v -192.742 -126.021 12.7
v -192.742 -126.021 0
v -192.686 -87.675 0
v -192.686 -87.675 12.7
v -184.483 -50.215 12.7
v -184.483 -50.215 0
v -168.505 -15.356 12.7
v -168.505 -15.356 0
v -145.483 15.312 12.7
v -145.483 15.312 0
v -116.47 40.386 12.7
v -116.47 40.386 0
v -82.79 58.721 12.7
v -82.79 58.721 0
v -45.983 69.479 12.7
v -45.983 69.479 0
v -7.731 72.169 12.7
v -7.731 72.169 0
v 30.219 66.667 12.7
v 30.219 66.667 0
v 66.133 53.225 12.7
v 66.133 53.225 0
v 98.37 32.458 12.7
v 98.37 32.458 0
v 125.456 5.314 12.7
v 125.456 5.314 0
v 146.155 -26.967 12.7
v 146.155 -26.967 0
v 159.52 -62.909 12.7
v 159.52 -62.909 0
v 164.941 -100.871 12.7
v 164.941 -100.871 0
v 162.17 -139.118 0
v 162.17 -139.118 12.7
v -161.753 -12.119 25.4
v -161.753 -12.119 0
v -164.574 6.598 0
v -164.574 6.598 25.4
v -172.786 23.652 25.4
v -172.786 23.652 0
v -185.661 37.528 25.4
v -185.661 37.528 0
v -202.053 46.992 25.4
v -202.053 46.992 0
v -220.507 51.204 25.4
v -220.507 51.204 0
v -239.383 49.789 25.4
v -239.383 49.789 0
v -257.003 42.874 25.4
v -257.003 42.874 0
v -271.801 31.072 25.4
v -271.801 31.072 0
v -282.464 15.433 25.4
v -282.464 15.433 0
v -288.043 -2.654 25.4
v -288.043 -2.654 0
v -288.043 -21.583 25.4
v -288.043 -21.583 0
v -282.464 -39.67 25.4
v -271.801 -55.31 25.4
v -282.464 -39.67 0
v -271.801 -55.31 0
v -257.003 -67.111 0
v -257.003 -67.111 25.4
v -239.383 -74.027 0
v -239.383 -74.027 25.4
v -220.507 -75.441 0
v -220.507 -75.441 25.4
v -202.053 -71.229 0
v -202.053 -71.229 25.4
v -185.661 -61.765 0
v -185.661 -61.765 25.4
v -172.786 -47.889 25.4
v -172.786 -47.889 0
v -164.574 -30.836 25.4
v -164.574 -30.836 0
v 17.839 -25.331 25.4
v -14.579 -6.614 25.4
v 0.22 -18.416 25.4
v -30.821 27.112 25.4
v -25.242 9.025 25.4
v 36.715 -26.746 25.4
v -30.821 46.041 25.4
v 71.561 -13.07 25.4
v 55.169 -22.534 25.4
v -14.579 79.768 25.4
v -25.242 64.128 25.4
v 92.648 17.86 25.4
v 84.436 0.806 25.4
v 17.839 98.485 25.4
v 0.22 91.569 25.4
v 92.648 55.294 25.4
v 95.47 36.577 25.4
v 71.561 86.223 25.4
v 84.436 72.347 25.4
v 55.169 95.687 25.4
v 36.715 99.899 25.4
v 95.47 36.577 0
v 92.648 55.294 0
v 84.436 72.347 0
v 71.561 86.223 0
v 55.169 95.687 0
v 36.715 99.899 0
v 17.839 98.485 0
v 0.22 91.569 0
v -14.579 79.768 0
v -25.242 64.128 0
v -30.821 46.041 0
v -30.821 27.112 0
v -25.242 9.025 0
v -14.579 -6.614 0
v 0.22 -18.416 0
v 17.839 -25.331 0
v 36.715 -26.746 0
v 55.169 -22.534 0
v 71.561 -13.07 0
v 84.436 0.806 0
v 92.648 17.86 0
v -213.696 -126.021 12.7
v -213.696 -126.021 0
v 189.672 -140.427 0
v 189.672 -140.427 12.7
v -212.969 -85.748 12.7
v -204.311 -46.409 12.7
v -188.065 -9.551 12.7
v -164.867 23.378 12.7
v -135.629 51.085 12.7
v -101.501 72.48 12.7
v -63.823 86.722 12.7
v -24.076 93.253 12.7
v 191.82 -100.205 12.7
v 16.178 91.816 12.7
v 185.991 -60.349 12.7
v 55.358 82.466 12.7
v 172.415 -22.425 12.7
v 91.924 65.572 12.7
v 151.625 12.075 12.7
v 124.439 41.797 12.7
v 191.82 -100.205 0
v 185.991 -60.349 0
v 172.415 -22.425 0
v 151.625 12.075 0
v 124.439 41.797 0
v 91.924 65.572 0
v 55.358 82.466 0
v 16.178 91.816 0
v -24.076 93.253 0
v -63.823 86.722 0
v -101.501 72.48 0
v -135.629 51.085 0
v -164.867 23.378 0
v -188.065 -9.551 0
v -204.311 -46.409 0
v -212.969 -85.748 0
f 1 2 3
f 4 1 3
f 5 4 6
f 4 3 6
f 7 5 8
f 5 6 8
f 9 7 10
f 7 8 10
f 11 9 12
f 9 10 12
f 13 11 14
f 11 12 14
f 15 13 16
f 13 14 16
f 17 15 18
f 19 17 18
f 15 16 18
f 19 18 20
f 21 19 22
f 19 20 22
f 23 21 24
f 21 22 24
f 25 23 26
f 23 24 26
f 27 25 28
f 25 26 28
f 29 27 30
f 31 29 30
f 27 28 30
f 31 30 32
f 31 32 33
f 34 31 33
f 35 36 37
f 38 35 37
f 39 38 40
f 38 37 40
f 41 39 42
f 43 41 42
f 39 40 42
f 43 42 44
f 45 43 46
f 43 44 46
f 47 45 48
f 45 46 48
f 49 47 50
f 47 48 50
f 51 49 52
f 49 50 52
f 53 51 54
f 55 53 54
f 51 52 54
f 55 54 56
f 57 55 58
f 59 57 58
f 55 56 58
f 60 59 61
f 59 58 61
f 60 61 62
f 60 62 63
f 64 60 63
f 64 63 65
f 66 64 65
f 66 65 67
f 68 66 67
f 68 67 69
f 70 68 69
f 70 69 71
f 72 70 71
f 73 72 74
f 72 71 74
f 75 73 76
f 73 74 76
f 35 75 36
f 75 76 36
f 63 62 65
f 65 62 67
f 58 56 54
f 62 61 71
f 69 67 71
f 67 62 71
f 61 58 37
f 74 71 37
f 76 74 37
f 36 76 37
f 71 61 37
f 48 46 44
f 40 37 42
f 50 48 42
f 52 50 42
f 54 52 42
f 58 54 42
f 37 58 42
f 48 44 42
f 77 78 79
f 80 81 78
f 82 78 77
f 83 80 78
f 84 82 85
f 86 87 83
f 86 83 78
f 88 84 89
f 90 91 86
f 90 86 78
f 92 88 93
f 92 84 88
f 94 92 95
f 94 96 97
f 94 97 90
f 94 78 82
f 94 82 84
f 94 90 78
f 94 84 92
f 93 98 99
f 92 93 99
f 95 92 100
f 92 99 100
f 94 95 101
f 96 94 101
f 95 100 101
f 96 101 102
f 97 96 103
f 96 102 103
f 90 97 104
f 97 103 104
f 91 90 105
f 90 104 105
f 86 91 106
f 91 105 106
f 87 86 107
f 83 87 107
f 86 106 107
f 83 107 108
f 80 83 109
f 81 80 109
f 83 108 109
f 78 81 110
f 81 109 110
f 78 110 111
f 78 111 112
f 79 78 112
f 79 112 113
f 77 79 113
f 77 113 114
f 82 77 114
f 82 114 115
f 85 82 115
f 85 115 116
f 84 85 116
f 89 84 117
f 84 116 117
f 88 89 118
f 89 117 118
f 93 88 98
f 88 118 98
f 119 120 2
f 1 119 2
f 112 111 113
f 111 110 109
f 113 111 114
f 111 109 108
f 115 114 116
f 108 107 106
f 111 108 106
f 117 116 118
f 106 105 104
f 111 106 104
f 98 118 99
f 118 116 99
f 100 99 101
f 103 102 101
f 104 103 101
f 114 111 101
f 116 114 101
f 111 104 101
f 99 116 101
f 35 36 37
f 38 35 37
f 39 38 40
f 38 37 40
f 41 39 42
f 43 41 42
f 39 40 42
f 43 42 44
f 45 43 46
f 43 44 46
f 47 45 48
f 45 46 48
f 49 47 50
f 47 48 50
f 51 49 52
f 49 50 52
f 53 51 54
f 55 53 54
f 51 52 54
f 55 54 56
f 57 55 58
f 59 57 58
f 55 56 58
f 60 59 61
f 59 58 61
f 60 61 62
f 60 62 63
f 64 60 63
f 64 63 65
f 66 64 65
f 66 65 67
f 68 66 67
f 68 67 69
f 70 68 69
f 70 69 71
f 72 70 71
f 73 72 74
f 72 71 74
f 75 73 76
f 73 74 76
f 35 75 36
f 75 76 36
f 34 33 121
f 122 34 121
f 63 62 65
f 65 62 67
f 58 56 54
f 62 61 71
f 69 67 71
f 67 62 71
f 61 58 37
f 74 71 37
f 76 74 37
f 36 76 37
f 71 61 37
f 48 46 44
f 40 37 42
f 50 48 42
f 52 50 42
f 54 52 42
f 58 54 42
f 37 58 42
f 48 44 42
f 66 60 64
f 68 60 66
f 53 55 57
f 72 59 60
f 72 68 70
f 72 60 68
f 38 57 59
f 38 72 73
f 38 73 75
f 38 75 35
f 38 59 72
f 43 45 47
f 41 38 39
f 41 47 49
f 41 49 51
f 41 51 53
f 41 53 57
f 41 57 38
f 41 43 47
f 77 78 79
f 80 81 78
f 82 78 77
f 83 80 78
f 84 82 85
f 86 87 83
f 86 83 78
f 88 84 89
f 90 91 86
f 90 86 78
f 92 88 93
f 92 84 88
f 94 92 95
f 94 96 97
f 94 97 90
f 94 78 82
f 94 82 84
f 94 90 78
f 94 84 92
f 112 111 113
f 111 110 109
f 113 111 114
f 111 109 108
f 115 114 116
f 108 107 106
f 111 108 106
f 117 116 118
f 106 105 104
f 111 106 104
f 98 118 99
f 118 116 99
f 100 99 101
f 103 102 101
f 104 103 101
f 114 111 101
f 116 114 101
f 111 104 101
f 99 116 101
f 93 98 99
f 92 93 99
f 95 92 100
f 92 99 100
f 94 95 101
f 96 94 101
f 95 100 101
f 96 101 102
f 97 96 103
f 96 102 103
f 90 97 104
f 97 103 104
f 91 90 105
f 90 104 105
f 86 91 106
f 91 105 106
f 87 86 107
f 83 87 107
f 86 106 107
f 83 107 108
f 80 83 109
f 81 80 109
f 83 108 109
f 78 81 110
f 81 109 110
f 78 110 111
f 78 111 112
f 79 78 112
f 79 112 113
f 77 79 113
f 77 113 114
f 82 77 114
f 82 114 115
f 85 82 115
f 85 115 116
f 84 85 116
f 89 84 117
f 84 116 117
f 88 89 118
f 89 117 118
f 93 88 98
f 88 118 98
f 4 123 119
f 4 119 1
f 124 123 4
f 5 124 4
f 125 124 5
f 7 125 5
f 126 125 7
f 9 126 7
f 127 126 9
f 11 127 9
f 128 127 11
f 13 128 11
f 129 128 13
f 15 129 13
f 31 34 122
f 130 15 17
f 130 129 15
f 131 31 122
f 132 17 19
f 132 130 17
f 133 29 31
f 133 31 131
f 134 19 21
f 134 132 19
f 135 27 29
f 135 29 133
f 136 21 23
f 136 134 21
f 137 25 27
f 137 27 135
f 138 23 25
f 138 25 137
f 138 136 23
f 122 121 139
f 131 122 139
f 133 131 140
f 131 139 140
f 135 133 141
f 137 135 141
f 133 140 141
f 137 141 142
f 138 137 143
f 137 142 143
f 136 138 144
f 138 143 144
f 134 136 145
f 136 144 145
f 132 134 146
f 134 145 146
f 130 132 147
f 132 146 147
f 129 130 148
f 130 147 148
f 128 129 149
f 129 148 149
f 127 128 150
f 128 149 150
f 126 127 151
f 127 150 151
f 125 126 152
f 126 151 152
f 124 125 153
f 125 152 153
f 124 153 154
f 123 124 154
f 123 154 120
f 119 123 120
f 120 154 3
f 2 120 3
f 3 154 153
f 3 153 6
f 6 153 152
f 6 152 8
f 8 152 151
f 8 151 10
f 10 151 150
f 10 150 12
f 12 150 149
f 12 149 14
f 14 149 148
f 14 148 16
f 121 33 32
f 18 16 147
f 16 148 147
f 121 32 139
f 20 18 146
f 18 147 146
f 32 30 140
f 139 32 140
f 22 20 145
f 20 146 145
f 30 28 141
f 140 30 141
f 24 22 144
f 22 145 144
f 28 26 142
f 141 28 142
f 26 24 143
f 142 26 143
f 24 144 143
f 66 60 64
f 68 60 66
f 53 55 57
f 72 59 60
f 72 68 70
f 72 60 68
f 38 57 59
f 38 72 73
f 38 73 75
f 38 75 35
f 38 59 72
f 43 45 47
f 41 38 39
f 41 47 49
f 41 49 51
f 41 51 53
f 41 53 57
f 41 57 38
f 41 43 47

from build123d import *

# Parameters (mm, degrees)
F0_R     = 63.5
F1_DEPTH = 25.4
F3_DEPTH = 12.7
F4_DEPTH = 25.4


with BuildPart() as f1:
    # F0 (on Top) → F1 (new body)
    with BuildSketch(Plane.XY):
        with Locations((-225.252611, -12.118626)):
            Circle(F0_R)
        with Locations((31.969504, 36.57659)):
            Circle(F0_R)
    extrude(amount=F1_DEPTH)


with BuildPart() as f3:
    # F2 (on Top) → F3 (new body)
    with BuildSketch(Plane.XY):
        with BuildLine():
            Line((162.17002, -139.117779), (189.672404, -140.427396))
            ThreePointArc((189.672404, -140.427396), (-3.913268, 93.534319), (-213.695968, -126.021403))
            Line((-213.695968, -126.021403), (-192.741764, -126.021403))
            ThreePointArc((-192.741764, -126.021403), (-7.730961, 72.168505), (162.17002, -139.117779))
        make_face()
    extrude(amount=F3_DEPTH)


with BuildPart() as f4:
    # F0 (on Top) → F4 (new body)
    with BuildSketch(Plane.XY):
        with Locations((-225.252611, -12.118626)):
            Circle(F0_R)
        with Locations((31.969504, 36.57659)):
            Circle(F0_R)
    extrude(amount=F4_DEPTH)


solid = Compound([f1.part, f3.part, f4.part])
